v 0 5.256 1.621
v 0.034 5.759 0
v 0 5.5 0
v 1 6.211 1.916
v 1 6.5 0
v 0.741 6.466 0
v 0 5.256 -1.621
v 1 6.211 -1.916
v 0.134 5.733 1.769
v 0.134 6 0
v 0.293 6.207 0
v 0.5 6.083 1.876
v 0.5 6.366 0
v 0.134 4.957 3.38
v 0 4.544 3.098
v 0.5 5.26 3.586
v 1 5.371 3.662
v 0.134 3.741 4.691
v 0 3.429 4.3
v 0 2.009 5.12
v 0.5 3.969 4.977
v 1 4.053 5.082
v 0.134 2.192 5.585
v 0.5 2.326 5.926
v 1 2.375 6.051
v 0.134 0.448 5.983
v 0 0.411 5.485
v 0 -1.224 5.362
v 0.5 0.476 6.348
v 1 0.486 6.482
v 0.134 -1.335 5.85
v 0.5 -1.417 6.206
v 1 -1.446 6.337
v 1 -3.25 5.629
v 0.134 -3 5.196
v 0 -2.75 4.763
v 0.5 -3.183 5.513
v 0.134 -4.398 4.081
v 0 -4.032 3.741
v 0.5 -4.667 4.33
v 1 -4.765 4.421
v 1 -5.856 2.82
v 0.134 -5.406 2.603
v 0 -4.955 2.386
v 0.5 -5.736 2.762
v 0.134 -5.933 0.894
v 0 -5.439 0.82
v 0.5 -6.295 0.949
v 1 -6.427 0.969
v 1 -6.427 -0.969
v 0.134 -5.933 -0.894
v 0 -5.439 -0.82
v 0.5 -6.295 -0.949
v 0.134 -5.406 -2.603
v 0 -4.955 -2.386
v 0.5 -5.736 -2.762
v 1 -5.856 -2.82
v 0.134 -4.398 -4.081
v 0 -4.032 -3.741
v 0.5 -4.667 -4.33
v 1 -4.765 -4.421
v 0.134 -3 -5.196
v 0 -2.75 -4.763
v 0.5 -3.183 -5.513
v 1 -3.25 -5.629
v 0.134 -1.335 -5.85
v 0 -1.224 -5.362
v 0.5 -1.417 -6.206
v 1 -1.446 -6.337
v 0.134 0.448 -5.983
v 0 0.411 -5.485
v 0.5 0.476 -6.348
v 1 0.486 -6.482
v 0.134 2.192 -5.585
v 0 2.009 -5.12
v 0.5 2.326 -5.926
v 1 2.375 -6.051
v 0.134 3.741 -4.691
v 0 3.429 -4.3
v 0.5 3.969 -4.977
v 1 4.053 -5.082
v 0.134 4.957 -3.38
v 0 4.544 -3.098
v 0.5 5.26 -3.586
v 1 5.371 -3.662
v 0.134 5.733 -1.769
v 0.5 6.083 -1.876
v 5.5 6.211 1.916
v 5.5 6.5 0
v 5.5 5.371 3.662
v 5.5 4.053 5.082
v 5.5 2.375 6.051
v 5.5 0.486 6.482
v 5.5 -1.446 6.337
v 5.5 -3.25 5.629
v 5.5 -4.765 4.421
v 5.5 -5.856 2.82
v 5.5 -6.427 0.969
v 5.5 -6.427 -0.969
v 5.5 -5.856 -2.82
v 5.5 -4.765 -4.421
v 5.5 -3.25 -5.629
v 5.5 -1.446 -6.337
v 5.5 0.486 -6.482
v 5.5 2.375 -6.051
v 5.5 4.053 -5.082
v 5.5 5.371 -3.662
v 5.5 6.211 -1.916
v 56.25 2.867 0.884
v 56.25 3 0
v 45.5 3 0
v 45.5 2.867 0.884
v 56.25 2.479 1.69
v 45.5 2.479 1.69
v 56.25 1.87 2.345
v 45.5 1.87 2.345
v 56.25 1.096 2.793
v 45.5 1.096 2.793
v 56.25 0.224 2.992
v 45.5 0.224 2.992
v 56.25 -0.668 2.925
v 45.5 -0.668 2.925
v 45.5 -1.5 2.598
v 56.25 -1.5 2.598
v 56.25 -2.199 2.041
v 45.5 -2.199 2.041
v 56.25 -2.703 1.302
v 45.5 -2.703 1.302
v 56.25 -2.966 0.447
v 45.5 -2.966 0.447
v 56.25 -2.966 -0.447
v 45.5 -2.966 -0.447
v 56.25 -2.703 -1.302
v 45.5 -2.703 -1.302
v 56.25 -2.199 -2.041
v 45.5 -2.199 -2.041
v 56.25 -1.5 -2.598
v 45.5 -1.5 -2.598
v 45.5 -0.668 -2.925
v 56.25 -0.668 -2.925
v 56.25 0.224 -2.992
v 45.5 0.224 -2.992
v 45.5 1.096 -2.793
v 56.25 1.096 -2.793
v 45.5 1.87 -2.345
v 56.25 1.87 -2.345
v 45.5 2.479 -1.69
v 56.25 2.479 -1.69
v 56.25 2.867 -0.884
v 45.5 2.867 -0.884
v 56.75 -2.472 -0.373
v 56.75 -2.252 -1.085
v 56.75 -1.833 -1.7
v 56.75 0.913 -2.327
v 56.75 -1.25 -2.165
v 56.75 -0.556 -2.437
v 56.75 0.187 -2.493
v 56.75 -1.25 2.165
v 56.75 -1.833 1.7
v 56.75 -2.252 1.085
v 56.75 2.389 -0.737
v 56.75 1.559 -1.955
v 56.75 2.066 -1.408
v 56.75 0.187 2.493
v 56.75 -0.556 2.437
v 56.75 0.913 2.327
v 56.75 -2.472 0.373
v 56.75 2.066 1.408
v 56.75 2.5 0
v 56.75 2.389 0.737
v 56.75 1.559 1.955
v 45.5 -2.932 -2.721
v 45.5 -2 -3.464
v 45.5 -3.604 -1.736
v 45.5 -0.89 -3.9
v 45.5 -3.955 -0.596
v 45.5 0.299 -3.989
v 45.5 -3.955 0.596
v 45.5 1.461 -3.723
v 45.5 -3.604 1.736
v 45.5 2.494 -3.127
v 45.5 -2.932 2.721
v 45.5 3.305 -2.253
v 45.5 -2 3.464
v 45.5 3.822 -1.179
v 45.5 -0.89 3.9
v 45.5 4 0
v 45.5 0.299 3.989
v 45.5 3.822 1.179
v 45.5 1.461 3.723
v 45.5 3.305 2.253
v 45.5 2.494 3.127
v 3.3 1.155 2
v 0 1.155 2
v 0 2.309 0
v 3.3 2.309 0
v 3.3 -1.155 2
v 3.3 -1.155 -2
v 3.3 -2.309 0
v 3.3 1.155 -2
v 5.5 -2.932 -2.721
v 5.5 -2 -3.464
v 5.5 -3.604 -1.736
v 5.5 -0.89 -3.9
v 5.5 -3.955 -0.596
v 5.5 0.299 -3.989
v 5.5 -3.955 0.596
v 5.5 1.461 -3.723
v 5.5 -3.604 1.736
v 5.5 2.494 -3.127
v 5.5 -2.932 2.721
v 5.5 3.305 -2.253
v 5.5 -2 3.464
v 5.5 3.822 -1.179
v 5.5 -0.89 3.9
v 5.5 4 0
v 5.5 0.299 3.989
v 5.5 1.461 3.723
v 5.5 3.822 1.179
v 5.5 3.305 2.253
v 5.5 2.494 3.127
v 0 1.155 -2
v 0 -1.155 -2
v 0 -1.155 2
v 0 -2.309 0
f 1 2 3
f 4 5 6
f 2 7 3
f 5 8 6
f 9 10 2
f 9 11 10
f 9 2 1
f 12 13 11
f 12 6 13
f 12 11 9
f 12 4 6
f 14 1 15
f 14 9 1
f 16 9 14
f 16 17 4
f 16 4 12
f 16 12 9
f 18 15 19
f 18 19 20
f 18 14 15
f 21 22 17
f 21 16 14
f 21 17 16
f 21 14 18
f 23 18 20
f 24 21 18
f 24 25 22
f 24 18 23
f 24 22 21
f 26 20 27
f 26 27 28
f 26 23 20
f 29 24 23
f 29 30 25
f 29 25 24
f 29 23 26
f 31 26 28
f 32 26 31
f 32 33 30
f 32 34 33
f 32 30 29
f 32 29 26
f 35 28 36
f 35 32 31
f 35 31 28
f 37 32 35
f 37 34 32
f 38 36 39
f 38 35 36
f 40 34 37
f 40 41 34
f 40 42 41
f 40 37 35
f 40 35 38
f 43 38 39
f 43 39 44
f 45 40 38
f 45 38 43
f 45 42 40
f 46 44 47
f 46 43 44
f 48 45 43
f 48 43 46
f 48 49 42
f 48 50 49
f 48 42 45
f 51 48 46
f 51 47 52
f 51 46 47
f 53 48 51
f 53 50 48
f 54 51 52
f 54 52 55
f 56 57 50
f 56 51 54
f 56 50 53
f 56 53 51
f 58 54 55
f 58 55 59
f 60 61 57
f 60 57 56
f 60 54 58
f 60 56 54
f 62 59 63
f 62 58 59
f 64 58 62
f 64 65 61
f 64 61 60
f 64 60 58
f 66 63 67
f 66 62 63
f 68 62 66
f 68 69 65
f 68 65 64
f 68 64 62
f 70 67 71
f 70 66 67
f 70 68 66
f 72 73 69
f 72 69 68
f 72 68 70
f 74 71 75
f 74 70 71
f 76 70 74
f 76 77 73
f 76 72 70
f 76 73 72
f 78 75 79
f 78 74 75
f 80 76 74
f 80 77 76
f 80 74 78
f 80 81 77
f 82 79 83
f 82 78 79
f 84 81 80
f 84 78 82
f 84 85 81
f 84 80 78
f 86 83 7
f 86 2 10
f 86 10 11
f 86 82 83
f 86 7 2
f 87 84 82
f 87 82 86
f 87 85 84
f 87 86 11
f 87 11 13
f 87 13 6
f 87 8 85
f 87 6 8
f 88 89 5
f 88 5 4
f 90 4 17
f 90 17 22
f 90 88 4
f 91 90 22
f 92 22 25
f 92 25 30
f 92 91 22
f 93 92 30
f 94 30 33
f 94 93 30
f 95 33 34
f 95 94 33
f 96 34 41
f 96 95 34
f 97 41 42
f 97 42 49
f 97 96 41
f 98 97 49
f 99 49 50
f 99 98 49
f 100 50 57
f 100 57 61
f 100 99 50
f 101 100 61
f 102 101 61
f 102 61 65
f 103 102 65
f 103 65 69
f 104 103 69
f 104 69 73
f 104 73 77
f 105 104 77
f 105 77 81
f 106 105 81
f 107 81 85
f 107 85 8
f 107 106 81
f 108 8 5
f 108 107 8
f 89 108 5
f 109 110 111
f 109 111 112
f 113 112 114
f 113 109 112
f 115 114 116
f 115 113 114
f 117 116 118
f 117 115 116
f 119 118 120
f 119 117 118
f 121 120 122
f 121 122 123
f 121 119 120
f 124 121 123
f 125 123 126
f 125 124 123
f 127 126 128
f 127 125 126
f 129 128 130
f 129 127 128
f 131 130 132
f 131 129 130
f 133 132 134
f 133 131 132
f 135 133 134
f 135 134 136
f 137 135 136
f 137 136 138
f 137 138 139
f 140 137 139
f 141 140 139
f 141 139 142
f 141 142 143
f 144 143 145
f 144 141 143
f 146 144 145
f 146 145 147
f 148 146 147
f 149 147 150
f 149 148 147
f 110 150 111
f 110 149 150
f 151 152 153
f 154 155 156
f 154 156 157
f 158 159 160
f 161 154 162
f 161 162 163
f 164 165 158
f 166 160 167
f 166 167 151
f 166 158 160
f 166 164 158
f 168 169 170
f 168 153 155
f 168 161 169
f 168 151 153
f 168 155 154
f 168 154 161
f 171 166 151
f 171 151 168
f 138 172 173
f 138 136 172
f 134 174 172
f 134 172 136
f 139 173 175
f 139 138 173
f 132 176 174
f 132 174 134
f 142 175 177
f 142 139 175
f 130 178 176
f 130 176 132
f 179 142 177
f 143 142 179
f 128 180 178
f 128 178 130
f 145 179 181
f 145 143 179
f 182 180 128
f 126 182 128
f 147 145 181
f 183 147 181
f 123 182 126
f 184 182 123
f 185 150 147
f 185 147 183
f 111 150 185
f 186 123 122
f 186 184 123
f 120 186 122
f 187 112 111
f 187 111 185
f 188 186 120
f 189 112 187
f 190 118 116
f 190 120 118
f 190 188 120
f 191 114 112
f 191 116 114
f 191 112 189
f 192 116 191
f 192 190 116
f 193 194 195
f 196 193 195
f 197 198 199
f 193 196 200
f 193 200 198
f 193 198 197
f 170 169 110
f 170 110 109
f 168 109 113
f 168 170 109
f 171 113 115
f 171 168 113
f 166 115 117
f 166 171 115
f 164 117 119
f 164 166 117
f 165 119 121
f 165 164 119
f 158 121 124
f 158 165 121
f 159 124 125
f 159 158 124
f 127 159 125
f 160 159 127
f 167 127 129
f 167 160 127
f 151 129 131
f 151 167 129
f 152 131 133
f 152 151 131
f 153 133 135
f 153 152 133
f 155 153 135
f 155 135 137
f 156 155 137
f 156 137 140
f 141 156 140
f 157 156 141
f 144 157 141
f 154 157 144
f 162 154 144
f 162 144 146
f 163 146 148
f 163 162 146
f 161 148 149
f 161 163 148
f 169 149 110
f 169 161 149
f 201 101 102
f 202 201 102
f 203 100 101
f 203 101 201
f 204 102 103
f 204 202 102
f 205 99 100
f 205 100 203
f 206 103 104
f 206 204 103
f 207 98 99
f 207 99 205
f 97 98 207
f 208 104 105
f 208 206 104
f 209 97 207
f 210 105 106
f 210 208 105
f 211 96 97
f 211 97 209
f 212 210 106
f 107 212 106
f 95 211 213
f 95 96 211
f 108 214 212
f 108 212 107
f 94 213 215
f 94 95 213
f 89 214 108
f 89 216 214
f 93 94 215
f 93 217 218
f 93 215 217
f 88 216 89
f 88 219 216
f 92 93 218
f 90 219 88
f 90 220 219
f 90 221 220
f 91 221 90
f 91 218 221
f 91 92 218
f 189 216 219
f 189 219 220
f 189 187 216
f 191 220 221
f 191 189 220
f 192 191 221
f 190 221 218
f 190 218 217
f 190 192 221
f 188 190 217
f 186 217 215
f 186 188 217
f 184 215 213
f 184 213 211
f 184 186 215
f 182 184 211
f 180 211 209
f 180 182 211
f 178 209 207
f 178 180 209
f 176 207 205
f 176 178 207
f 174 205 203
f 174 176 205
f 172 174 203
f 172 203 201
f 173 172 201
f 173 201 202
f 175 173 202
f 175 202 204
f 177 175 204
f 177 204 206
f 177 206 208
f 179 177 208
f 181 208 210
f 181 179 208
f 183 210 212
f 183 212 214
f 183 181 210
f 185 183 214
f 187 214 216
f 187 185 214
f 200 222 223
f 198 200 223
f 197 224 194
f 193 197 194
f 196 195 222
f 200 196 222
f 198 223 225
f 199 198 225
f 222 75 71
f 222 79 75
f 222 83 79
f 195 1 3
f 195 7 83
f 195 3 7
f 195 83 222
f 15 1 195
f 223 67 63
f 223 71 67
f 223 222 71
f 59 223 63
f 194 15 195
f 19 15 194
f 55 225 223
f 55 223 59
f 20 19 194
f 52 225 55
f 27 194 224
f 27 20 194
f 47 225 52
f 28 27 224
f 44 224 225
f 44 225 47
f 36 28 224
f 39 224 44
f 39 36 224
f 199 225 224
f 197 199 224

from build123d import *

# Parameters (mm, degrees)
CUT_EXTRUDE_1_DEPTH = 3.3
FILLET_1_R          = 1
CHAMFER_1_SIZE      = 0.5


with BuildPart() as part:
    # 草图1 → 旋转1 (revolve)
    with BuildSketch(Plane.XY):
        Polygon((0, 0), (0, 6.5), (5.5, 6.5), (5.5, 4), (45.5, 4), (45.5, 3), (56.75, 3), (56.75, 0), align=None)
    revolve(axis=Axis((0, 0, 0), (1, 0, 0)))

    # 草图2 → 切除-拉伸1 (cut)
    with BuildSketch(Plane.ZY):
        Polygon((0, 2.309401077), (-2, 1.154700538), (-2, -1.154700538), (0, -2.309401077), (2, -1.154700538), (2, 1.154700538), align=None)
    extrude(amount=-CUT_EXTRUDE_1_DEPTH, mode=Mode.SUBTRACT)

    # 圆角1
    fillet_1_edges = [part.edges().sort_by_distance(p)[0] for p in [
        (0, -6.5, 0),
    ]]
    fillet(fillet_1_edges, radius=FILLET_1_R)

    # 倒角1
    chamfer_1_edges = [part.edges().sort_by_distance(p)[0] for p in [
        (56.75, -3, 0),
    ]]
    chamfer(chamfer_1_edges, length=CHAMFER_1_SIZE)


solid = part.part
